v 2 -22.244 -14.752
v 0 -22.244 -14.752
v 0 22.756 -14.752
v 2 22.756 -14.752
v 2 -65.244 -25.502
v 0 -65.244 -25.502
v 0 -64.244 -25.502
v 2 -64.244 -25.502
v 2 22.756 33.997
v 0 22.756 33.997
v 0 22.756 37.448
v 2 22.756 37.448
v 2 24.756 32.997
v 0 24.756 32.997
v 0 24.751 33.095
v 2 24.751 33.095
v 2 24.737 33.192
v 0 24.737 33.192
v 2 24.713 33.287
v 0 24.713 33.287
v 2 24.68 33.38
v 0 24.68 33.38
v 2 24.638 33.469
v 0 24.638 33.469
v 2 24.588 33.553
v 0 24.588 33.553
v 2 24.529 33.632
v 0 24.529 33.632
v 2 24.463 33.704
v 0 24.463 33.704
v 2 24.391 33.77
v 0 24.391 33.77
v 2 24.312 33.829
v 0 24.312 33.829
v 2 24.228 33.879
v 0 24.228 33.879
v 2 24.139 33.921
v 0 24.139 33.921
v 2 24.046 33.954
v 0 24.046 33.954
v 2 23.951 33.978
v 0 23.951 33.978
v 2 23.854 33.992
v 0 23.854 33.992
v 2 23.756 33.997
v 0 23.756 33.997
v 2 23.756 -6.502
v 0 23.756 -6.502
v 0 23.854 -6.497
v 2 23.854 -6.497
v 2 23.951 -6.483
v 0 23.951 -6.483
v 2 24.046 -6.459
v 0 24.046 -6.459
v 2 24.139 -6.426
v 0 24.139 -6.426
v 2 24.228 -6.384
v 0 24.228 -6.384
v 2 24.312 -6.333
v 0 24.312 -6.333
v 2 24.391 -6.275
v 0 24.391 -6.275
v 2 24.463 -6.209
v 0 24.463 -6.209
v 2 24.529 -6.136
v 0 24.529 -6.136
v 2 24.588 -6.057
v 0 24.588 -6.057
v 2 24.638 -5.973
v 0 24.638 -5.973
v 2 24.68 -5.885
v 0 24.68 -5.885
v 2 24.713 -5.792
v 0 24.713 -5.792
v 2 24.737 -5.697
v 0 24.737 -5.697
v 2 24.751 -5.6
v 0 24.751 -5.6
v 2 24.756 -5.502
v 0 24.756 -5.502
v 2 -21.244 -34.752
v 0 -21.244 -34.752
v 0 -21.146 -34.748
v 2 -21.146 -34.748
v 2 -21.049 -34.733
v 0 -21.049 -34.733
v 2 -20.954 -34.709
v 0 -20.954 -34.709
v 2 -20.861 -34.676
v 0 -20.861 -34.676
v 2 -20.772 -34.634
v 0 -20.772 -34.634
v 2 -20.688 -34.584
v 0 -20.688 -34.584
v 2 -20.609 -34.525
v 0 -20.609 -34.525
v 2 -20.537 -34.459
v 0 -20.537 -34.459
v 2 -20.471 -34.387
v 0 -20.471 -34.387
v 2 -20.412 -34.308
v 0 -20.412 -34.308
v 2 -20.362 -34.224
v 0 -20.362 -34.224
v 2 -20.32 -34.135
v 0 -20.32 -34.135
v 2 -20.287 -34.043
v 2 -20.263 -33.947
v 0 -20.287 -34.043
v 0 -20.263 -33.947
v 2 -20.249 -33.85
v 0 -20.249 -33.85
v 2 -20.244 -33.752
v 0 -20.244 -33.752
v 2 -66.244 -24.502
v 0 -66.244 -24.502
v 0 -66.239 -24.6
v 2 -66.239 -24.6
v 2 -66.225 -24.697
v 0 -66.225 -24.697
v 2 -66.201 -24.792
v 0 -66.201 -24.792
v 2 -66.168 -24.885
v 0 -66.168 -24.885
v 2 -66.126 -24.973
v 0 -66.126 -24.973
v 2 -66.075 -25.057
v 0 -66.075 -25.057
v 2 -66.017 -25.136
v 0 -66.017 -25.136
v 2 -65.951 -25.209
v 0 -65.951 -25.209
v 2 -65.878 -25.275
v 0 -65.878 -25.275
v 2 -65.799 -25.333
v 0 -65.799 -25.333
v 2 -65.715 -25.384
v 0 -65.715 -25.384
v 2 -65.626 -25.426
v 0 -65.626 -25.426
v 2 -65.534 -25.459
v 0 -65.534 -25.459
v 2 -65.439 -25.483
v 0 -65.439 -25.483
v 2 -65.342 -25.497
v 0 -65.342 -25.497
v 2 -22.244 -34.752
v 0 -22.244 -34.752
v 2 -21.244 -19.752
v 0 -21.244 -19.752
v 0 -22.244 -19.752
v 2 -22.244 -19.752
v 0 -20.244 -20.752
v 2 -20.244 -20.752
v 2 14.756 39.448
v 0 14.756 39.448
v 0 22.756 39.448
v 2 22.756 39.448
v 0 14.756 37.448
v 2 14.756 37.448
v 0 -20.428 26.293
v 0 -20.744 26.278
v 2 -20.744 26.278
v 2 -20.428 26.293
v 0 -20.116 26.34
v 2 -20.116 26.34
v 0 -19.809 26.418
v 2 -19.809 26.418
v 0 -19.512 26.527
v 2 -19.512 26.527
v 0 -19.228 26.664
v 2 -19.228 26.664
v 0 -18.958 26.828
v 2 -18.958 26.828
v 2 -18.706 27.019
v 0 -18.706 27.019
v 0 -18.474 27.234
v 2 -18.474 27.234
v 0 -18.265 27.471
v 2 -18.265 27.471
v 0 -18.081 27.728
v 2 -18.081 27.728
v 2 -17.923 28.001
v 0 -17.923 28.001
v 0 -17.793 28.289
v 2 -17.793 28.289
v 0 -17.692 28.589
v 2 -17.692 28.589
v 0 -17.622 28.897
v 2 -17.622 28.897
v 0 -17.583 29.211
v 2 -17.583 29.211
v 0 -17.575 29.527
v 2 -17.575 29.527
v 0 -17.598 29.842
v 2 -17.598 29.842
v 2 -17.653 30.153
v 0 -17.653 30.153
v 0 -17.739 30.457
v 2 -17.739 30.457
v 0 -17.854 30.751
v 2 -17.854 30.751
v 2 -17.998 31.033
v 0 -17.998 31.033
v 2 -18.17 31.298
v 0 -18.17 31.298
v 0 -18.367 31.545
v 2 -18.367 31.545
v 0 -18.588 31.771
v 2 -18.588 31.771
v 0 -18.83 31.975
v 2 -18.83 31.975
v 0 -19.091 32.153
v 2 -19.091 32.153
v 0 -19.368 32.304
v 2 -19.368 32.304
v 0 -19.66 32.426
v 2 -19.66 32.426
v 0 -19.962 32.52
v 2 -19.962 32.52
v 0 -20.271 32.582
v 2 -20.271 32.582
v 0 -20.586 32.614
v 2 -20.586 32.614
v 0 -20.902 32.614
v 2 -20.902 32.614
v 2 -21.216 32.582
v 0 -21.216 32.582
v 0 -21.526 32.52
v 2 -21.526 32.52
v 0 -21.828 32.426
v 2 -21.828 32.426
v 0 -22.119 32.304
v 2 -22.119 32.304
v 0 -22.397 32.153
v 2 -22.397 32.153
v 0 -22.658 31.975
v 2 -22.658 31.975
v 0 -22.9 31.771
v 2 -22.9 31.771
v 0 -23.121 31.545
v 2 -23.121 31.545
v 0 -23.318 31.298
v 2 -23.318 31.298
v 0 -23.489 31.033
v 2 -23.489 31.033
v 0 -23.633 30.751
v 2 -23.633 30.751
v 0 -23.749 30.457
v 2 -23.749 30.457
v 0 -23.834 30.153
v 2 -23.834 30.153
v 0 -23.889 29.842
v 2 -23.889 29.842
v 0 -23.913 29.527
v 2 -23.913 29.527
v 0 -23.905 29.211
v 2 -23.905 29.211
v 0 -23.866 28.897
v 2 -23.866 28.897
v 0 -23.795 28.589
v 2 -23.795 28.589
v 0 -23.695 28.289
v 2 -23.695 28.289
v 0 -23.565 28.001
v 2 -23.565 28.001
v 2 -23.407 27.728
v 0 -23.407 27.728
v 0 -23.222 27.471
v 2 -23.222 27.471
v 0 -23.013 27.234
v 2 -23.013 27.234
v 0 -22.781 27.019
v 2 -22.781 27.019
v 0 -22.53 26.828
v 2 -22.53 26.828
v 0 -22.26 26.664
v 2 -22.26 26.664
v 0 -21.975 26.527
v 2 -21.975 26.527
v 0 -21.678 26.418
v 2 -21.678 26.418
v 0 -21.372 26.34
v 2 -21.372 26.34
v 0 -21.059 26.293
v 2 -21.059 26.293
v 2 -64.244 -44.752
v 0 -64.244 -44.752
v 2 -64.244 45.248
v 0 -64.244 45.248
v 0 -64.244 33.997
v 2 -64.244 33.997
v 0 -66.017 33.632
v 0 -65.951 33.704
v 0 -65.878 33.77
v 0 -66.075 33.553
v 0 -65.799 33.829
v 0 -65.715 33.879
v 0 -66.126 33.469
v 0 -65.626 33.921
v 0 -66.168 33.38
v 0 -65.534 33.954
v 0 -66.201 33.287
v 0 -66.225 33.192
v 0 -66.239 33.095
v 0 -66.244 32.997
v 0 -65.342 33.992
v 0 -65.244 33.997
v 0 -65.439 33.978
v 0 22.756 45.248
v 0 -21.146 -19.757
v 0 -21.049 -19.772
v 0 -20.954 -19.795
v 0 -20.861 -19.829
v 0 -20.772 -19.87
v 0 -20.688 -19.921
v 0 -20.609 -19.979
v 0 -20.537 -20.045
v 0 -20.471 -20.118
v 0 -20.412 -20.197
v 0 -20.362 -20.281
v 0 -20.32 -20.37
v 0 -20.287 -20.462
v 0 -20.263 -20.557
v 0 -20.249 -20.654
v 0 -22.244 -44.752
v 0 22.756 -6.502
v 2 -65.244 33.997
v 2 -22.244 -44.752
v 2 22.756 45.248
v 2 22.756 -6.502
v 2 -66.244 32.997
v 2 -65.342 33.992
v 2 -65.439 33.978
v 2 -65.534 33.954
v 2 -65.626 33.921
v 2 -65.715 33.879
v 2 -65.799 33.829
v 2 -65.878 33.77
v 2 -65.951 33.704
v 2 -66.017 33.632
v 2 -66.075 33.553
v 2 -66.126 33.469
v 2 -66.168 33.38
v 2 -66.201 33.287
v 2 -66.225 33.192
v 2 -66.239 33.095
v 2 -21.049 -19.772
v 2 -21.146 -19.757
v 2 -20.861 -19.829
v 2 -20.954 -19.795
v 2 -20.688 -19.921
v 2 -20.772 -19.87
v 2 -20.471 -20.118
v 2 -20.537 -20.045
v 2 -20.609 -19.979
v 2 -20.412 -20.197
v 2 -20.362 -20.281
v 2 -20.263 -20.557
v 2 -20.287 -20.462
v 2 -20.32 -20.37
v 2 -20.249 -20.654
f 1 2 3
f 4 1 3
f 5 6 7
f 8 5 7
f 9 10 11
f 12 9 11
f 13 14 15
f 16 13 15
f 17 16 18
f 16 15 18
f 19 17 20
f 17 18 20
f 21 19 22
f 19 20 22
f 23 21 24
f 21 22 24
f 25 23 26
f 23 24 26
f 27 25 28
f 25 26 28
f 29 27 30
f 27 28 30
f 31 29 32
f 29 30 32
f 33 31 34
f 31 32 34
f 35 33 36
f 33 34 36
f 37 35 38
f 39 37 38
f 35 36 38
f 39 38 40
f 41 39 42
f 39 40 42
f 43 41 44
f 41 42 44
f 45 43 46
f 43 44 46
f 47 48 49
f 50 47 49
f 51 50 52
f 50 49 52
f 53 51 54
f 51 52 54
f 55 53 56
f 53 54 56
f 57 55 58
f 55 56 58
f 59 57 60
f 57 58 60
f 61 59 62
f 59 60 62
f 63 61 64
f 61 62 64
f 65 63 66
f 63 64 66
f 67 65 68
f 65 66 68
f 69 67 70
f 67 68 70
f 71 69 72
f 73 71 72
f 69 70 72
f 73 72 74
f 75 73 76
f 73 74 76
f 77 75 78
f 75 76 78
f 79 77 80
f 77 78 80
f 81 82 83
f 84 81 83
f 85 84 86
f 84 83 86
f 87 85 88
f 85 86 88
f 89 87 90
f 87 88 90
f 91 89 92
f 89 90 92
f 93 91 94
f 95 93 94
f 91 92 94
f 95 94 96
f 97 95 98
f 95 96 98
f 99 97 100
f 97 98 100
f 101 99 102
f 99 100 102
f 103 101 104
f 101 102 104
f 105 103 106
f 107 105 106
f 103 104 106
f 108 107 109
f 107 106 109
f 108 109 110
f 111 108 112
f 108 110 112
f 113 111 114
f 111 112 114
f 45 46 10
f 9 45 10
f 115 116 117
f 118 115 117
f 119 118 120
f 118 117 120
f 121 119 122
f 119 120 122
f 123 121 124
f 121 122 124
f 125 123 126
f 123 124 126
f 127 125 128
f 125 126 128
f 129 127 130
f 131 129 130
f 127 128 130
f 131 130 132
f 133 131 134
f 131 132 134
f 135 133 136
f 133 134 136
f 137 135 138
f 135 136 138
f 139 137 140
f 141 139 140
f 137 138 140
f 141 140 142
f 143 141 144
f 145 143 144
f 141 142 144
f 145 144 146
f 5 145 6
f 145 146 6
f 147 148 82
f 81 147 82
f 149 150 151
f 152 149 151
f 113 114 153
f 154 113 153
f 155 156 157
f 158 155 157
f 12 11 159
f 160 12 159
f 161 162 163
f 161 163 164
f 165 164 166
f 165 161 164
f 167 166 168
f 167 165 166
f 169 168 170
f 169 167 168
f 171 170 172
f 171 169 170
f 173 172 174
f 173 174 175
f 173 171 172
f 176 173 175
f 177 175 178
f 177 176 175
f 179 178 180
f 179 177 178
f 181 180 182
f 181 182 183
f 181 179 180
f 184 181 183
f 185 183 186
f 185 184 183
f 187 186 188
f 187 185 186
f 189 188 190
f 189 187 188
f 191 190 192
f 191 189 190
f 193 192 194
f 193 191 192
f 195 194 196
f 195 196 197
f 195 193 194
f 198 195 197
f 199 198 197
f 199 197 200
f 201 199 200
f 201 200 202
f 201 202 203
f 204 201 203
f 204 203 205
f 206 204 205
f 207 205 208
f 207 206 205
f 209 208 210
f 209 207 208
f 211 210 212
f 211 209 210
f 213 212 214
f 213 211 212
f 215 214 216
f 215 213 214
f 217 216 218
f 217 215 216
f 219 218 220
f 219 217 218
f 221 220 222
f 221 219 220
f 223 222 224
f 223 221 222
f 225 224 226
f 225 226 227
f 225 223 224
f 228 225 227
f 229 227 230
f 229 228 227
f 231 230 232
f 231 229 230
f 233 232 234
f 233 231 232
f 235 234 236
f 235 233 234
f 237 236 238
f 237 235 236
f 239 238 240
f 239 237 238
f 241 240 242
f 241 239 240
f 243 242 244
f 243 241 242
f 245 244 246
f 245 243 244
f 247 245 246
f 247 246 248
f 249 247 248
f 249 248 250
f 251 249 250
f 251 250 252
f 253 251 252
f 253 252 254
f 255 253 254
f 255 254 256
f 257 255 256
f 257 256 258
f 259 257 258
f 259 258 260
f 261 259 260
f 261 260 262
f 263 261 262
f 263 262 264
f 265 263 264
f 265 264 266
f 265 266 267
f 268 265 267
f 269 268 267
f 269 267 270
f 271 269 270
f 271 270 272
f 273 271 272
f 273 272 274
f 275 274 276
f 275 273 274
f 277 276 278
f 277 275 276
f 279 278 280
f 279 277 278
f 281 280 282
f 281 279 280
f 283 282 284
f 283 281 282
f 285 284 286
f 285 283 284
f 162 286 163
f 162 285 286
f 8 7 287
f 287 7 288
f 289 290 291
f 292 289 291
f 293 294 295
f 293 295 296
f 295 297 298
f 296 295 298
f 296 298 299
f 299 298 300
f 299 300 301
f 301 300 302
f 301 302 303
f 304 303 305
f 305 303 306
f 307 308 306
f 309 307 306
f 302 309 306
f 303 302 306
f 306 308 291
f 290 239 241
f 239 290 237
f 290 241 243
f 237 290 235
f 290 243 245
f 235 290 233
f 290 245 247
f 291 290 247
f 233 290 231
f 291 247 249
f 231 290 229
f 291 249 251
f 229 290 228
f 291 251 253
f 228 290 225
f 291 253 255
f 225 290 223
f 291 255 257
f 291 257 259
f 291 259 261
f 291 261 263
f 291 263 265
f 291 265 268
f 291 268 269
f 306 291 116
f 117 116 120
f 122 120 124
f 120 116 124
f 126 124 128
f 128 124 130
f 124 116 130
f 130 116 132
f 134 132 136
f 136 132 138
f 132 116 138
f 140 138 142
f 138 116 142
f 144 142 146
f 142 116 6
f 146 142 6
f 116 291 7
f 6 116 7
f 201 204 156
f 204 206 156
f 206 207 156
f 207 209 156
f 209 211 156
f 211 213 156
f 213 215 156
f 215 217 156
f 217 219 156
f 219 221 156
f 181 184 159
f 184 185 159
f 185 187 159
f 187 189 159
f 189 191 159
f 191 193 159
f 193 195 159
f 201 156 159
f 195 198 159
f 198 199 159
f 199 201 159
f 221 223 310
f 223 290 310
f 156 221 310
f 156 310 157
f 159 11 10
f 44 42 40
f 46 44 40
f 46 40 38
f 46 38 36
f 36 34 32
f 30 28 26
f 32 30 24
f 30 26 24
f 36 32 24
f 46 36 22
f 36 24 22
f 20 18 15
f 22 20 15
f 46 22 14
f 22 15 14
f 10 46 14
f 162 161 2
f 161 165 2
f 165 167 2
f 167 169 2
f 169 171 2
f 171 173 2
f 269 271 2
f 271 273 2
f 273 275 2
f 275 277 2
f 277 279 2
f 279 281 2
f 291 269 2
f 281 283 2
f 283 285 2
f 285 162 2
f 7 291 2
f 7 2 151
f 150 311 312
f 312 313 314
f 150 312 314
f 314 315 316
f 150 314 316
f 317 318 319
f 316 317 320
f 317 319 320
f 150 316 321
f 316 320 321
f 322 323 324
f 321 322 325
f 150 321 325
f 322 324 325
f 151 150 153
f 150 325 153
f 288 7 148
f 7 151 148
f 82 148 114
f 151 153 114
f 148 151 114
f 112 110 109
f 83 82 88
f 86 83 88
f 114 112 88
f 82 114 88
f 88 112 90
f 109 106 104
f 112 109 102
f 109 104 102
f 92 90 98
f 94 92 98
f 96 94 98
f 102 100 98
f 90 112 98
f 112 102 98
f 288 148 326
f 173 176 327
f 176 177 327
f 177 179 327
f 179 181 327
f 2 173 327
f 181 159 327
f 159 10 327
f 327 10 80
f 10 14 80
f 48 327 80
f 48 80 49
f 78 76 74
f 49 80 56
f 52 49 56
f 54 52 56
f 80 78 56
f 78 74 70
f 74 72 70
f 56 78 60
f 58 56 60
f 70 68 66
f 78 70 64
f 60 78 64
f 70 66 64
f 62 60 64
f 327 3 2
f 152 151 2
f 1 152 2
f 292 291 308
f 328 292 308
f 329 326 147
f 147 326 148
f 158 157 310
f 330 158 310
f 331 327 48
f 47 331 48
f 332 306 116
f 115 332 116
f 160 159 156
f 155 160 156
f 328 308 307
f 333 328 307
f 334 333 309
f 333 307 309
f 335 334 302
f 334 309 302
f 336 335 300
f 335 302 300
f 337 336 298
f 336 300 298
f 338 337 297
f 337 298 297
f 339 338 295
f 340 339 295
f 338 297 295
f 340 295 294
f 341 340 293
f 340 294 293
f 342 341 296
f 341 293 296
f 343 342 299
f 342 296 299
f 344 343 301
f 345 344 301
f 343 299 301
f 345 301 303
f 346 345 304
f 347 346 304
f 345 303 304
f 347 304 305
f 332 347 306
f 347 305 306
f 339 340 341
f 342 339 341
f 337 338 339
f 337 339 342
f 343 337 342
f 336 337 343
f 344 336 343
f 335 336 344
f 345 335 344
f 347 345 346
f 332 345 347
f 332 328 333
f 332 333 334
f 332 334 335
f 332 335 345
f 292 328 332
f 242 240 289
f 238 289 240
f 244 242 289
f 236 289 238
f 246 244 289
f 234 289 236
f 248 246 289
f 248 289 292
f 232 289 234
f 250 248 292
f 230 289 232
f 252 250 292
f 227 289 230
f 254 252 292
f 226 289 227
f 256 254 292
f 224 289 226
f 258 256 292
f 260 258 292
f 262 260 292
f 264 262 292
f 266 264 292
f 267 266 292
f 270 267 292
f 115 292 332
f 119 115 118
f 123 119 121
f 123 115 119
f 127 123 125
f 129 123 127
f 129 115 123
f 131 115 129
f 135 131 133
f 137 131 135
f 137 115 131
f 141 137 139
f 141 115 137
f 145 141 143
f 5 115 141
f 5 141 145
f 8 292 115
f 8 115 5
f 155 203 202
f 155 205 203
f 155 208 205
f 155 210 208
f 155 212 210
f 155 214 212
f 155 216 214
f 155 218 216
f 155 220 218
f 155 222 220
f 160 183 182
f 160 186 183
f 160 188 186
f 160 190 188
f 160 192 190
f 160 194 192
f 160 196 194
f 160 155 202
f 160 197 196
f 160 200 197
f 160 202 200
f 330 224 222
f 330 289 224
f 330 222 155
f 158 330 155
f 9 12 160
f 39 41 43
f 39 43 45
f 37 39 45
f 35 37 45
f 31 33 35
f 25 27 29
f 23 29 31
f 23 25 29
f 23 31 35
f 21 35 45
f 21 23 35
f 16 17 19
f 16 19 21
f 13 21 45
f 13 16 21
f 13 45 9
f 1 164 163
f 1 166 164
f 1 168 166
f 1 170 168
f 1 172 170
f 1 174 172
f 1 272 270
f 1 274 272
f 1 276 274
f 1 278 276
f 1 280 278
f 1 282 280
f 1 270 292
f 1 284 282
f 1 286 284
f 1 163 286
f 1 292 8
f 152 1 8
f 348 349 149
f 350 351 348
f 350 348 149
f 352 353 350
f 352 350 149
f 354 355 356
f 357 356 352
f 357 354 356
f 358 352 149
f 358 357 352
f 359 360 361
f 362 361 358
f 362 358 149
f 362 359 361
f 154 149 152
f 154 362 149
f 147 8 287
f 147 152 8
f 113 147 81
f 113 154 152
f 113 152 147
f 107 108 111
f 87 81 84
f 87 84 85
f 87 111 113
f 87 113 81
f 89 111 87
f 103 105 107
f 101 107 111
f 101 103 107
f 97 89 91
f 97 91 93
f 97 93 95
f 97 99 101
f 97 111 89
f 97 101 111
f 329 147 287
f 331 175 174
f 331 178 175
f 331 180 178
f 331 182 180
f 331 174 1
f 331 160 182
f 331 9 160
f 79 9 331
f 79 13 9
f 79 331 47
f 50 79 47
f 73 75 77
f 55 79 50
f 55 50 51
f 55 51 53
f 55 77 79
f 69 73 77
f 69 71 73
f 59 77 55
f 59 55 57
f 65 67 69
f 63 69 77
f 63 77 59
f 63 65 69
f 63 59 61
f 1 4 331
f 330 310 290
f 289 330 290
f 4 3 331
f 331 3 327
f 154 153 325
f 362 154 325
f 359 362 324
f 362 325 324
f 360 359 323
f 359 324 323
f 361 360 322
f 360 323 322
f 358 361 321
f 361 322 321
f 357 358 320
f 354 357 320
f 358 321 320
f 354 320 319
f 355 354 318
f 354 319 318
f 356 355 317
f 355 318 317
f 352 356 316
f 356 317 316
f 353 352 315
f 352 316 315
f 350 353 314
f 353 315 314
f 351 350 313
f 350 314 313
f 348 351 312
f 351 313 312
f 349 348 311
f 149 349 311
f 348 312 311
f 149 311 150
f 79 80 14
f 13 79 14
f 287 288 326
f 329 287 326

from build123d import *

# Parameters (mm, degrees)
SKETCH2_R           = 3.17
BOSS_EXTRUDE1_DEPTH = 2


with BuildPart() as part:
    # Sketch2 → Boss-Extrude1 (new body)
    with BuildSketch(Plane(origin=(0, 0, 0), x_dir=(0, 0, -1), z_dir=(1, 0, 0))):
        with BuildLine():
            Line((44.752383591, -64.243785516), (44.752383591, -22.243785516))
            Line((44.752383591, -22.243785516), (34.752383591, -22.243785516))
            Line((34.752383591, -22.243785516), (34.752383591, -21.243785516))
            ThreePointArc((34.752383591, -21.243785516), (34.459490372, -20.536678734), (33.752383591, -20.243785516))
            Line((33.752383591, -20.243785516), (20.752383591, -20.243785516))
            ThreePointArc((20.752383591, -20.243785516), (20.045276809, -20.536678734), (19.752383591, -21.243785516))
            Line((19.752383591, -21.243785516), (19.752383591, -22.243785516))
            Line((19.752383591, -22.243785516), (14.752383591, -22.243785516))
            Line((14.752383591, -22.243785516), (14.752383591, 22.756214484))
            Line((14.752383591, 22.756214484), (6.501874719, 22.756214484))
            Line((6.501874719, 22.756214484), (6.501874719, 23.756214484))
            ThreePointArc((6.501874719, 23.756214484), (6.2089815, 24.463321266), (5.501874719, 24.756214484))
            Line((5.501874719, 24.756214484), (-32.997107538, 24.756214484))
            ThreePointArc((-32.997107538, 24.756214484), (-33.704214319, 24.463321266), (-33.997107538, 23.756214484))
            Line((-33.997107538, 23.756214484), (-33.997107538, 22.756214484))
            Line((-33.997107538, 22.756214484), (-37.447616409, 22.756214484))
            Line((-37.447616409, 22.756214484), (-37.447616409, 14.756214484))
            Line((-37.447616409, 14.756214484), (-39.447616409, 14.756214484))
            Line((-39.447616409, 14.756214484), (-39.447616409, 22.756214484))
            Line((-39.447616409, 22.756214484), (-45.247616409, 22.756214484))
            Line((-45.247616409, 22.756214484), (-45.247616409, -64.243785516))
            Line((-45.247616409, -64.243785516), (-33.997107538, -64.243785516))
            Line((-33.997107538, -64.243785516), (-33.997107538, -65.243785516))
            ThreePointArc((-33.997107538, -65.243785516), (-33.704214319, -65.950892297), (-32.997107538, -66.243785516))
            Line((-32.997107538, -66.243785516), (24.501874719, -66.243785516))
            ThreePointArc((24.501874719, -66.243785516), (25.2089815, -65.950892297), (25.501874719, -65.243785516))
            Line((25.501874719, -65.243785516), (25.501874719, -64.243785516))
            Line((25.501874719, -64.243785516), (44.752383591, -64.243785516))
        make_face()
        with Locations((-29.447616409, -20.743785516)):
            Circle(SKETCH2_R, mode=Mode.SUBTRACT)
    extrude(amount=BOSS_EXTRUDE1_DEPTH)


solid = part.part
